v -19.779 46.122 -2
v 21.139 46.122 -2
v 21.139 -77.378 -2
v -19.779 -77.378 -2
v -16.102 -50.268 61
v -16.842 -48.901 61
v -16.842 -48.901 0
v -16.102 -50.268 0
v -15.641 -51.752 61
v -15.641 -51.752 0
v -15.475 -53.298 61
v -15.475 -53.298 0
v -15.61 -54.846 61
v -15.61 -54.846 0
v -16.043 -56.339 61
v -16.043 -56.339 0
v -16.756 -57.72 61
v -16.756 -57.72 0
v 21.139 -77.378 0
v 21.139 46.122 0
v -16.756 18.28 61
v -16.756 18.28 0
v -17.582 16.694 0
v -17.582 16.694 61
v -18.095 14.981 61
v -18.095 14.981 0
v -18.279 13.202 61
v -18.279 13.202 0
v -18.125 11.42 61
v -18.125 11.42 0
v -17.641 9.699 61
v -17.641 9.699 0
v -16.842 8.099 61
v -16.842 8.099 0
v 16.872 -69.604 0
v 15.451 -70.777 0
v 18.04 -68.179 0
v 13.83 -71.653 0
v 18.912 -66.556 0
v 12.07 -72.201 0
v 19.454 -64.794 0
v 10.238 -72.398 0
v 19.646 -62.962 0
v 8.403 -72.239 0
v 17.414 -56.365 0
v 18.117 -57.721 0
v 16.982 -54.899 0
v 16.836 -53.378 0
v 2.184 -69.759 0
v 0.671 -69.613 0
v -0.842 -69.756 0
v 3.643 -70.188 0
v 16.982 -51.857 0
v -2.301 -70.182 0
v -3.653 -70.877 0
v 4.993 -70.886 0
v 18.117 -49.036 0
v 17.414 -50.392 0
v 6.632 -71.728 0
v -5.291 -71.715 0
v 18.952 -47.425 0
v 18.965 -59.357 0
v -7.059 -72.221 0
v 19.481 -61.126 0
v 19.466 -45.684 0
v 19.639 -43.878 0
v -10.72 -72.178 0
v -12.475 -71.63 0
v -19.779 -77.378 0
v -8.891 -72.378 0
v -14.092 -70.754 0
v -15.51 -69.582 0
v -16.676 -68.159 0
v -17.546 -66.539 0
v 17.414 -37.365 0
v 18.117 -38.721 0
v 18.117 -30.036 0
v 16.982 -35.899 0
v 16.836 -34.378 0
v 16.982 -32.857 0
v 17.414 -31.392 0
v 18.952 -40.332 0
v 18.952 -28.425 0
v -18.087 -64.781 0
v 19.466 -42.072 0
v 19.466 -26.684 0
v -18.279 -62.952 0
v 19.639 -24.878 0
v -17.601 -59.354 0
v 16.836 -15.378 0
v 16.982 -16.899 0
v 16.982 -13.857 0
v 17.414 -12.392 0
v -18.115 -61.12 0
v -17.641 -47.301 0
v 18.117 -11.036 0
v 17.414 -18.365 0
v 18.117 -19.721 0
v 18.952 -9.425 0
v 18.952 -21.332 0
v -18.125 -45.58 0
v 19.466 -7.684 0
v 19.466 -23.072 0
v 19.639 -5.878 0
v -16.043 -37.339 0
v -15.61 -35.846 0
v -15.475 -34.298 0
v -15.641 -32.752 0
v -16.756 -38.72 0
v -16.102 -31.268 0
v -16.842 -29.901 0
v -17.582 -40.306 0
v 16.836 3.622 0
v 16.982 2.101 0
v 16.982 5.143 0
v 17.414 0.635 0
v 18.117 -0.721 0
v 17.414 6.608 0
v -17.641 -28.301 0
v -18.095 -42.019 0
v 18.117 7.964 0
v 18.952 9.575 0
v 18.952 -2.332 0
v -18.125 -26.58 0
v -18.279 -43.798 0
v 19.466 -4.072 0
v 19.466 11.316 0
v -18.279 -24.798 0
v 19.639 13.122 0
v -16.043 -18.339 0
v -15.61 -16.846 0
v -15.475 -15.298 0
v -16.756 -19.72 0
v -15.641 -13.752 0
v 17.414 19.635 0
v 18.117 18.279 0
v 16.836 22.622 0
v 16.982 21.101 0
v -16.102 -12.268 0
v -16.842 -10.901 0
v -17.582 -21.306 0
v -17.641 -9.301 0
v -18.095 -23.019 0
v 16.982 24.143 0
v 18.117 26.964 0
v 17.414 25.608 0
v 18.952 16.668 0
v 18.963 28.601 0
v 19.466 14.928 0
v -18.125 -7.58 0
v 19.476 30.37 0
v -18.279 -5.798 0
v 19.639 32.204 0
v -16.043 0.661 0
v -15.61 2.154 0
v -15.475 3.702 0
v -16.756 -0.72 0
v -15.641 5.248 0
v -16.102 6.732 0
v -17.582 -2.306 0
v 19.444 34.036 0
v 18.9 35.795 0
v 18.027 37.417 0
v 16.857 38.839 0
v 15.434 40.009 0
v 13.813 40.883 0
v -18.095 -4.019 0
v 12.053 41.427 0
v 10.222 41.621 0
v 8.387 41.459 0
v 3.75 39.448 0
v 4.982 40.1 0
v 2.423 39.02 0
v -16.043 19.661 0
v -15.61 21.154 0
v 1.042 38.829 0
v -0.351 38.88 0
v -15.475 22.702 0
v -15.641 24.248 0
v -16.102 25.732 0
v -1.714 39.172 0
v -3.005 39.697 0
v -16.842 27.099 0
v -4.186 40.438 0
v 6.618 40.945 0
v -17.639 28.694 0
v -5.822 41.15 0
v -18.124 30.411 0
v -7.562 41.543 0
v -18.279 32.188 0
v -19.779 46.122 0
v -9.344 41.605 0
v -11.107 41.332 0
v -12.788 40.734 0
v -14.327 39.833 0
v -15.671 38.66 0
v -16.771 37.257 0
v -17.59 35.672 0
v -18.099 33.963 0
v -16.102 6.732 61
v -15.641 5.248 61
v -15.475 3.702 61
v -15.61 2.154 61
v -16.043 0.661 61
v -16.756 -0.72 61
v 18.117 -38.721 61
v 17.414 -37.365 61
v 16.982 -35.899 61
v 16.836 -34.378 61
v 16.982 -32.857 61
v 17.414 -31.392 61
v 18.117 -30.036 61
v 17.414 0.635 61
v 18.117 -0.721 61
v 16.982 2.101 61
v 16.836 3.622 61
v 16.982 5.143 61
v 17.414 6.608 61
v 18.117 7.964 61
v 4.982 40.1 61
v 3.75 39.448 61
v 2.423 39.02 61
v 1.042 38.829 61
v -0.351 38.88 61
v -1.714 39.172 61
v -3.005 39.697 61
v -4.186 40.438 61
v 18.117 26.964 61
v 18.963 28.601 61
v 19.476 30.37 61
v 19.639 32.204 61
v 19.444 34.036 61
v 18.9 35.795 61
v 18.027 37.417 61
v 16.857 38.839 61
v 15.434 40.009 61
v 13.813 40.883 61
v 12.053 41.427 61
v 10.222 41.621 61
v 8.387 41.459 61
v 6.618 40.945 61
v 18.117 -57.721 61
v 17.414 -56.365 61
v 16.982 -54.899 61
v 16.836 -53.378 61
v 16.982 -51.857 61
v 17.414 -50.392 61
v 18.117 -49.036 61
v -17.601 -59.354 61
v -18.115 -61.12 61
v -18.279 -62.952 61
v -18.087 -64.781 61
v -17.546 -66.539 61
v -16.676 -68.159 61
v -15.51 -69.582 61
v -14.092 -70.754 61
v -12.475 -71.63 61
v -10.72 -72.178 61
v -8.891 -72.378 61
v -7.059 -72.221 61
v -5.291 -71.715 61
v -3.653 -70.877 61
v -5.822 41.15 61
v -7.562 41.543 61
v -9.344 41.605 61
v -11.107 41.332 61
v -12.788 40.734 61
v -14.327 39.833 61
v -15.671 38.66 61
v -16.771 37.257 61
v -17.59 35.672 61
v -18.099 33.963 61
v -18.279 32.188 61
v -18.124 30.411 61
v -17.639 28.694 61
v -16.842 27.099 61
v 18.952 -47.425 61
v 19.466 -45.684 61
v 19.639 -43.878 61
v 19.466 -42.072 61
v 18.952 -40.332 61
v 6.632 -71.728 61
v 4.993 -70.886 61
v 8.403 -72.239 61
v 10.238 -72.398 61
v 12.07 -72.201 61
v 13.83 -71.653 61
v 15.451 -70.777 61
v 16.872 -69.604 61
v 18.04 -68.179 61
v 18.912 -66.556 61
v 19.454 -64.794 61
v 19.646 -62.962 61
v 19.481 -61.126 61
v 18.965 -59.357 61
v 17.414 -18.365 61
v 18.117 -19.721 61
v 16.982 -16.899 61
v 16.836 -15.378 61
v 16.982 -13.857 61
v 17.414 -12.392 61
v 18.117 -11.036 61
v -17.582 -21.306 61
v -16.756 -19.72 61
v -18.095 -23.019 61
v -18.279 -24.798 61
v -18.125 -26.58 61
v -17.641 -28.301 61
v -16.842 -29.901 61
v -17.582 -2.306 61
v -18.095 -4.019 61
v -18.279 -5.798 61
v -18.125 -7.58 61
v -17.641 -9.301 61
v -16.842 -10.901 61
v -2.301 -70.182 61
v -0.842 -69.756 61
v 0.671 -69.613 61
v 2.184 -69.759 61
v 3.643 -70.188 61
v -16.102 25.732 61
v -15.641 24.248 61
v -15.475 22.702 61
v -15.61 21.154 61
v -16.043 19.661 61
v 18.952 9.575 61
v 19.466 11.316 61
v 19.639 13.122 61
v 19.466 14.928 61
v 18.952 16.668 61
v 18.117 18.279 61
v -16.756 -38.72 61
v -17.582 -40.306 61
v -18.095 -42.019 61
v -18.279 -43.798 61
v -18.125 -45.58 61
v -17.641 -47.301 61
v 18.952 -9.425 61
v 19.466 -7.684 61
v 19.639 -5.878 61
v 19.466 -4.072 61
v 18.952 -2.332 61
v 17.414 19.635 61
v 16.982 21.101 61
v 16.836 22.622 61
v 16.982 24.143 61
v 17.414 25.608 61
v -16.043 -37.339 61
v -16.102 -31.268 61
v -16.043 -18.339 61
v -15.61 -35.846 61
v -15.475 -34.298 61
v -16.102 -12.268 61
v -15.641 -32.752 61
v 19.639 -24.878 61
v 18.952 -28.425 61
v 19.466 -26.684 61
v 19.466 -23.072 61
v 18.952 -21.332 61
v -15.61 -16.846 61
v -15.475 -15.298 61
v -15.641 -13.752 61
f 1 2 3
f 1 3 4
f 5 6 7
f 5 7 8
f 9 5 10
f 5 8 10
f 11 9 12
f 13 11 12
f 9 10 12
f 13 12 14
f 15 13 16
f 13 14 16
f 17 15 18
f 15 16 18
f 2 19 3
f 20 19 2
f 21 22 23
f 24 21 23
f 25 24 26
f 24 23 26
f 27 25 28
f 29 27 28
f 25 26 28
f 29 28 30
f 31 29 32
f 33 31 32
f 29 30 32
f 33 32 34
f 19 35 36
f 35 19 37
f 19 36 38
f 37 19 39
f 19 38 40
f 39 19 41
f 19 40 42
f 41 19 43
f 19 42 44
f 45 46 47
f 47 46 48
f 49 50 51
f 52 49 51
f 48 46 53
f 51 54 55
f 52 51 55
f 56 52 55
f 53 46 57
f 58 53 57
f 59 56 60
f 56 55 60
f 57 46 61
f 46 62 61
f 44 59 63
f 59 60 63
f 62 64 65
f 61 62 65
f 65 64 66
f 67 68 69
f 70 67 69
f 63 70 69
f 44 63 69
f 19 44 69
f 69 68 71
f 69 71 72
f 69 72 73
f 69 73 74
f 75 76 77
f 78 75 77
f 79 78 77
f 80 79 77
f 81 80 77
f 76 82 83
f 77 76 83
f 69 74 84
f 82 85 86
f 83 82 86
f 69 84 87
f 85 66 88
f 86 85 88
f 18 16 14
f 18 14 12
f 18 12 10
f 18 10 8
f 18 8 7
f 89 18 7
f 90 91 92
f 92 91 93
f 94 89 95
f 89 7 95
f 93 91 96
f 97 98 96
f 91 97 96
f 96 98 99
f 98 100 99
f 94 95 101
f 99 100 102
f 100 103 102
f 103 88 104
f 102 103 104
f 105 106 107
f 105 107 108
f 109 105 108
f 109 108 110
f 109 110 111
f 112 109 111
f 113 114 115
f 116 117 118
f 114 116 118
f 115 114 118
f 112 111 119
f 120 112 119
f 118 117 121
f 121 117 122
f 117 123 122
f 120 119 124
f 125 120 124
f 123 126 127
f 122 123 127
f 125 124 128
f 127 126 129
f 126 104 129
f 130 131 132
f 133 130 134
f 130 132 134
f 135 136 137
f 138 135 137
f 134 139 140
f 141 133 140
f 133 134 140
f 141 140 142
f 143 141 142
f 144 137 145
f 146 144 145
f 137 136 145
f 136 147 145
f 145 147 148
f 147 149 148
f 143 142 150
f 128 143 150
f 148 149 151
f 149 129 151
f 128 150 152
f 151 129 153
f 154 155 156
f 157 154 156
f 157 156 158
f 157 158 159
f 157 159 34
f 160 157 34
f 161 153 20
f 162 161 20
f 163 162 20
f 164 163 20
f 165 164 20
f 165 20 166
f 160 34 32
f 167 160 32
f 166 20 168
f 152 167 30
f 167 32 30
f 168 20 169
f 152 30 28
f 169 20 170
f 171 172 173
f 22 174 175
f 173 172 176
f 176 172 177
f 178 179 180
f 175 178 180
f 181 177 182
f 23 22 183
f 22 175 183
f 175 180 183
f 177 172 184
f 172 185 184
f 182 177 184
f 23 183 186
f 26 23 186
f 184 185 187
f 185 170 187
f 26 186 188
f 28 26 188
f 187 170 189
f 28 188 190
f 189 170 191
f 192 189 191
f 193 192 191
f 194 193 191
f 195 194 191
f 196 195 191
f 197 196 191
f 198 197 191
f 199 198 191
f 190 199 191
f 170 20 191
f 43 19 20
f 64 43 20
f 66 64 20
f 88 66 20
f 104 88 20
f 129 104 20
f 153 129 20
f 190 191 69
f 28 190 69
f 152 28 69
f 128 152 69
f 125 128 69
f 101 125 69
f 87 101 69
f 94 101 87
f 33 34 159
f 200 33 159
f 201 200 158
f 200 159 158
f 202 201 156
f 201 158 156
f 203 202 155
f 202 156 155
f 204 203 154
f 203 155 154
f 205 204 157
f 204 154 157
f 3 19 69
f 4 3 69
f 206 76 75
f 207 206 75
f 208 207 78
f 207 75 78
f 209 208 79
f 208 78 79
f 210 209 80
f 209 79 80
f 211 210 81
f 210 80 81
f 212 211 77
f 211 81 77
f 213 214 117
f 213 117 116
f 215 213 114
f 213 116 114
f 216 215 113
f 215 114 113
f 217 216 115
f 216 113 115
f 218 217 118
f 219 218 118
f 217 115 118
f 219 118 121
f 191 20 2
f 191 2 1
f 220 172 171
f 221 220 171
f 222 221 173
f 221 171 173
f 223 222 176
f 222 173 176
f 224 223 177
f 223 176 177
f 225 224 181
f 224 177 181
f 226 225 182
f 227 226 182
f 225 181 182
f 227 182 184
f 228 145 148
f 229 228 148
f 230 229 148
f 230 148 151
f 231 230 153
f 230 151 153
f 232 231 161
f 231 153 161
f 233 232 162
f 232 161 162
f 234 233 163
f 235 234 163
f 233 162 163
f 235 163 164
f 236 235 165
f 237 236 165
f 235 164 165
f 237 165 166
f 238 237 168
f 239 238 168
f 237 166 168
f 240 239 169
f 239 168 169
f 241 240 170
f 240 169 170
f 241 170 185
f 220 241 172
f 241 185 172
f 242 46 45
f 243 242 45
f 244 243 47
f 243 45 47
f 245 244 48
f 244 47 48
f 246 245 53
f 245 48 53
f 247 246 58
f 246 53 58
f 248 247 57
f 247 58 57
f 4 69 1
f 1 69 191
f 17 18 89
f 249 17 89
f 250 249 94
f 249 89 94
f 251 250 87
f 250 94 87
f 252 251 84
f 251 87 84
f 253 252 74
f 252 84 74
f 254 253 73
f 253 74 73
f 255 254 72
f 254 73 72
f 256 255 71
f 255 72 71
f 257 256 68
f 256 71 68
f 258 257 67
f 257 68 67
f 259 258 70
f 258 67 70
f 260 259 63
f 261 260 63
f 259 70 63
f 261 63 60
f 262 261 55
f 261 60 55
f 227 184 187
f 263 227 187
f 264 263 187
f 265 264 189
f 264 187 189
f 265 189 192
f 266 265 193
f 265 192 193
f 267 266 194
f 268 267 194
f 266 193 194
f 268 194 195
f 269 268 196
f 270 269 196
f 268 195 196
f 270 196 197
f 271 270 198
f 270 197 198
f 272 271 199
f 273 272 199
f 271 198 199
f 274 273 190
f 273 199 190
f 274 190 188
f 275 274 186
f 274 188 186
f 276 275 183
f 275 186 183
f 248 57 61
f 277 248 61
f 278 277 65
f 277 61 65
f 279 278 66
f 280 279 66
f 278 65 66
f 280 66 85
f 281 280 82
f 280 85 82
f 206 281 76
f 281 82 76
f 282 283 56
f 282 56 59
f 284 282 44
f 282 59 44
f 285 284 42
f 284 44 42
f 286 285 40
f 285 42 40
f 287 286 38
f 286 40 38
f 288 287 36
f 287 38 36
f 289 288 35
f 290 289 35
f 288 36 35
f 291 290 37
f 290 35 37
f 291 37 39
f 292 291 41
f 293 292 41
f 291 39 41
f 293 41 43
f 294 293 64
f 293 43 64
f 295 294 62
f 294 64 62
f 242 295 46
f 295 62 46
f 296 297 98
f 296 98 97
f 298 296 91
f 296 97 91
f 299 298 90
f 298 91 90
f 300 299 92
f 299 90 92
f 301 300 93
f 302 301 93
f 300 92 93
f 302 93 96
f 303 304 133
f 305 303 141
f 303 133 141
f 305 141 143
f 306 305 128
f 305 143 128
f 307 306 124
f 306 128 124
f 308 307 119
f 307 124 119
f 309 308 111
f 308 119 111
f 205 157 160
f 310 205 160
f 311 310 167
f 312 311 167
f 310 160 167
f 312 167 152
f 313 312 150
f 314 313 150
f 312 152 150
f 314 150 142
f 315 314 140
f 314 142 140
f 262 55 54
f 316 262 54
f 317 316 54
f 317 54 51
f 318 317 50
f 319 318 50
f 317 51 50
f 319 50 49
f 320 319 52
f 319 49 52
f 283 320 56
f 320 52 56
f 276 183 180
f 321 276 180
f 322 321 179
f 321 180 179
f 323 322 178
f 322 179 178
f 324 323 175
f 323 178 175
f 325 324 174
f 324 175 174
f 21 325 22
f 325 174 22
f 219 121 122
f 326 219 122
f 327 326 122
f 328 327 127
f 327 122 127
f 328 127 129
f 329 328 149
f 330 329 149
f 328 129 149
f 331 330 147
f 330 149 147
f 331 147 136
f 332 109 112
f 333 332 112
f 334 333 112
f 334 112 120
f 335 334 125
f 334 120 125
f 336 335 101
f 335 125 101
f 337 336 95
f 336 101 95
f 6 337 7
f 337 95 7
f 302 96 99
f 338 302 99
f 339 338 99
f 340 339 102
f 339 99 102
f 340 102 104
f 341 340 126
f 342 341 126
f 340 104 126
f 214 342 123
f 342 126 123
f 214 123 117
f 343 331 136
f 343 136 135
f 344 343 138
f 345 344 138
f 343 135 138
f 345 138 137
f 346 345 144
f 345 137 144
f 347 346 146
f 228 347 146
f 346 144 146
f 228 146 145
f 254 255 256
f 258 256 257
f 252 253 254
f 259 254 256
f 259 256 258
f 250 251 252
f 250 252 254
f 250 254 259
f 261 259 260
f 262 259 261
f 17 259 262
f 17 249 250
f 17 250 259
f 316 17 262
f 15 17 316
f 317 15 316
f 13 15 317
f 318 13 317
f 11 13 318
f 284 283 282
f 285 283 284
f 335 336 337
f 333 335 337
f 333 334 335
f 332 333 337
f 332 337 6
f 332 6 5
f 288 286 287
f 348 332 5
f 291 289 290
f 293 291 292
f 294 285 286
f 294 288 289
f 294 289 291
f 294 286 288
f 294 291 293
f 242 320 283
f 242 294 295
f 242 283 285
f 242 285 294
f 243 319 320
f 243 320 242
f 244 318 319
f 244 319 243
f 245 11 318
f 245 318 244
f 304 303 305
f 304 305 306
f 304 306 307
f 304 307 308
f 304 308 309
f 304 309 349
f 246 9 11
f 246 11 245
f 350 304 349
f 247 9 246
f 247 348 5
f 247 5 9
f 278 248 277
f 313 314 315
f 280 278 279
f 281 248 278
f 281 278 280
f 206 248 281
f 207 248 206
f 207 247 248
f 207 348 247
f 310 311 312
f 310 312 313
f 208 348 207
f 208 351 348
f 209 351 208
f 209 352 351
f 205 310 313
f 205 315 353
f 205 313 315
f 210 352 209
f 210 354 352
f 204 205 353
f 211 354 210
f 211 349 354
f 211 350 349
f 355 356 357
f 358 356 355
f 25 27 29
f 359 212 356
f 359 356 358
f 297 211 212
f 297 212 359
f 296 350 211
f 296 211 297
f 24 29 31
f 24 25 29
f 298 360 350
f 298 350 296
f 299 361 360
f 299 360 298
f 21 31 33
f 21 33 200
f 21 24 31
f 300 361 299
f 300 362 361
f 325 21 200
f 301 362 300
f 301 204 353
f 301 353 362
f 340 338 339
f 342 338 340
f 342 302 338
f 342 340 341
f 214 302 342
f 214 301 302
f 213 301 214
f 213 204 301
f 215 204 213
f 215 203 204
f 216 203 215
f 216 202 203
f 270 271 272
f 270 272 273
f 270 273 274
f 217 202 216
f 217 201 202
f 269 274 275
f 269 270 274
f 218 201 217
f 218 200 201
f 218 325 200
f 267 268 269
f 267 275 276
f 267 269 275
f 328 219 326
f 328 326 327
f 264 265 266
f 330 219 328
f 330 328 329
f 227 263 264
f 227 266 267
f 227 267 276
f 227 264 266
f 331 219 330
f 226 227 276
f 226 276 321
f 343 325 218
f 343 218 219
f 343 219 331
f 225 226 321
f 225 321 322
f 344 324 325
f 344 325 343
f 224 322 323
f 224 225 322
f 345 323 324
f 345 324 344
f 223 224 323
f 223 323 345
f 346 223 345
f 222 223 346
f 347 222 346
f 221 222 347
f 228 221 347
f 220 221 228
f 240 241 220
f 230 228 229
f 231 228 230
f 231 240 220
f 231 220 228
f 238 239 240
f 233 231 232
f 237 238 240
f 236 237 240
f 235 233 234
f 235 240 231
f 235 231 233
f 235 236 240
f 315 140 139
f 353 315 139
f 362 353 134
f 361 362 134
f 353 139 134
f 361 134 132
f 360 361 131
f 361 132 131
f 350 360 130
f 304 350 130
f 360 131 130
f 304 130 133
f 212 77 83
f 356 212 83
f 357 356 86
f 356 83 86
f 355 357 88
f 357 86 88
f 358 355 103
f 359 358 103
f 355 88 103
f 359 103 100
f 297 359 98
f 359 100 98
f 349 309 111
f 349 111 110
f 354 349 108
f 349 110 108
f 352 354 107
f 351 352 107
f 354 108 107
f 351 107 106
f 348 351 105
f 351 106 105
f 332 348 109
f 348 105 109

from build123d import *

# Parameters (mm, degrees)
EXTRUDE1_DEPTH = 61
SKETCH2_W      = 40.918085351
SKETCH2_H      = 123.5
EXTRUDE6_DEPTH = 2


with BuildPart() as part:
    # Sketch1 → Extrude1 (new body)
    with BuildSketch(Plane.XY):
        with BuildLine():
            ThreePointArc((18.117441581, 26.964443994), (16.856617983, 38.839101272), (4.981960705, 40.09992487))
            ThreePointArc((4.981960705, 40.09992487), (0.344560099, 38.823949387), (-4.1863741, 40.437713029))
            ThreePointArc((-4.1863741, 40.437713029), (-15.67064328, 38.66031776), (-16.842423207, 27.098548676))
            ThreePointArc((-16.842423207, 27.098548676), (-15.474586856, 22.702284028), (-16.756389299, 18.280168965))
            ThreePointArc((-16.756389299, 18.280168965), (-18.278642652, 13.201858254), (-16.842423207, 8.098548676))
            ThreePointArc((-16.842423207, 8.098548676), (-15.474586856, 3.702284028), (-16.756389299, -0.719831035))
            ThreePointArc((-16.756389299, -0.719831035), (-18.278642652, -5.798141746), (-16.842423207, -10.901451324))
            ThreePointArc((-16.842423207, -10.901451324), (-15.474586856, -15.297715972), (-16.756389299, -19.719831035))
            ThreePointArc((-16.756389299, -19.719831035), (-18.278642652, -24.798141746), (-16.842423207, -29.901451324))
            ThreePointArc((-16.842423207, -29.901451324), (-15.474586856, -34.297715972), (-16.756389299, -38.719831035))
            ThreePointArc((-16.756389299, -38.719831035), (-18.278642652, -43.798141746), (-16.842423207, -48.901451324))
            ThreePointArc((-16.842423207, -48.901451324), (-15.474586856, -53.297715972), (-16.756389299, -57.719831035))
            ThreePointArc((-16.756389299, -57.719831035), (-15.510318105, -69.582077178), (-3.653305695, -70.877003311))
            ThreePointArc((-3.653305695, -70.877003311), (0.671232667, -69.612662366), (4.993176556, -70.885843854))
            ThreePointArc((4.993176556, -70.885843854), (16.87201709, -69.603985894), (18.117441581, -57.721270292))
            ThreePointArc((18.117441581, -57.721270292), (16.836042019, -53.378413149), (18.117441581, -49.035556006))
            ThreePointArc((18.117441581, -49.035556006), (19.639103562, -43.878413149), (18.117441581, -38.721270292))
            ThreePointArc((18.117441581, -38.721270292), (16.836042019, -34.378413149), (18.117441581, -30.035556006))
            ThreePointArc((18.117441581, -30.035556006), (19.639103562, -24.878413149), (18.117441581, -19.721270292))
            ThreePointArc((18.117441581, -19.721270292), (16.836042019, -15.378413149), (18.117441581, -11.035556006))
            ThreePointArc((18.117441581, -11.035556006), (19.639103562, -5.878413149), (18.117441581, -0.721270292))
            ThreePointArc((18.117441581, -0.721270292), (16.836042019, 3.621586851), (18.117441581, 7.964443994))
            ThreePointArc((18.117441581, 7.964443994), (19.639103562, 13.121586851), (18.117441581, 18.278729708))
            ThreePointArc((18.117441581, 18.278729708), (16.836042019, 22.621586851), (18.117441581, 26.964443994))
        make_face()
    extrude(amount=EXTRUDE1_DEPTH)

    # Sketch2 → Extrude6 (add)
    with BuildSketch(Plane(origin=(0, 0, 0), x_dir=(-1, 0, 0), z_dir=(0, 0, -1))):
        with Locations((-0.680060887, -15.628413149)):
            Rectangle(SKETCH2_W, SKETCH2_H)
    extrude(amount=EXTRUDE6_DEPTH)


solid = part.part
